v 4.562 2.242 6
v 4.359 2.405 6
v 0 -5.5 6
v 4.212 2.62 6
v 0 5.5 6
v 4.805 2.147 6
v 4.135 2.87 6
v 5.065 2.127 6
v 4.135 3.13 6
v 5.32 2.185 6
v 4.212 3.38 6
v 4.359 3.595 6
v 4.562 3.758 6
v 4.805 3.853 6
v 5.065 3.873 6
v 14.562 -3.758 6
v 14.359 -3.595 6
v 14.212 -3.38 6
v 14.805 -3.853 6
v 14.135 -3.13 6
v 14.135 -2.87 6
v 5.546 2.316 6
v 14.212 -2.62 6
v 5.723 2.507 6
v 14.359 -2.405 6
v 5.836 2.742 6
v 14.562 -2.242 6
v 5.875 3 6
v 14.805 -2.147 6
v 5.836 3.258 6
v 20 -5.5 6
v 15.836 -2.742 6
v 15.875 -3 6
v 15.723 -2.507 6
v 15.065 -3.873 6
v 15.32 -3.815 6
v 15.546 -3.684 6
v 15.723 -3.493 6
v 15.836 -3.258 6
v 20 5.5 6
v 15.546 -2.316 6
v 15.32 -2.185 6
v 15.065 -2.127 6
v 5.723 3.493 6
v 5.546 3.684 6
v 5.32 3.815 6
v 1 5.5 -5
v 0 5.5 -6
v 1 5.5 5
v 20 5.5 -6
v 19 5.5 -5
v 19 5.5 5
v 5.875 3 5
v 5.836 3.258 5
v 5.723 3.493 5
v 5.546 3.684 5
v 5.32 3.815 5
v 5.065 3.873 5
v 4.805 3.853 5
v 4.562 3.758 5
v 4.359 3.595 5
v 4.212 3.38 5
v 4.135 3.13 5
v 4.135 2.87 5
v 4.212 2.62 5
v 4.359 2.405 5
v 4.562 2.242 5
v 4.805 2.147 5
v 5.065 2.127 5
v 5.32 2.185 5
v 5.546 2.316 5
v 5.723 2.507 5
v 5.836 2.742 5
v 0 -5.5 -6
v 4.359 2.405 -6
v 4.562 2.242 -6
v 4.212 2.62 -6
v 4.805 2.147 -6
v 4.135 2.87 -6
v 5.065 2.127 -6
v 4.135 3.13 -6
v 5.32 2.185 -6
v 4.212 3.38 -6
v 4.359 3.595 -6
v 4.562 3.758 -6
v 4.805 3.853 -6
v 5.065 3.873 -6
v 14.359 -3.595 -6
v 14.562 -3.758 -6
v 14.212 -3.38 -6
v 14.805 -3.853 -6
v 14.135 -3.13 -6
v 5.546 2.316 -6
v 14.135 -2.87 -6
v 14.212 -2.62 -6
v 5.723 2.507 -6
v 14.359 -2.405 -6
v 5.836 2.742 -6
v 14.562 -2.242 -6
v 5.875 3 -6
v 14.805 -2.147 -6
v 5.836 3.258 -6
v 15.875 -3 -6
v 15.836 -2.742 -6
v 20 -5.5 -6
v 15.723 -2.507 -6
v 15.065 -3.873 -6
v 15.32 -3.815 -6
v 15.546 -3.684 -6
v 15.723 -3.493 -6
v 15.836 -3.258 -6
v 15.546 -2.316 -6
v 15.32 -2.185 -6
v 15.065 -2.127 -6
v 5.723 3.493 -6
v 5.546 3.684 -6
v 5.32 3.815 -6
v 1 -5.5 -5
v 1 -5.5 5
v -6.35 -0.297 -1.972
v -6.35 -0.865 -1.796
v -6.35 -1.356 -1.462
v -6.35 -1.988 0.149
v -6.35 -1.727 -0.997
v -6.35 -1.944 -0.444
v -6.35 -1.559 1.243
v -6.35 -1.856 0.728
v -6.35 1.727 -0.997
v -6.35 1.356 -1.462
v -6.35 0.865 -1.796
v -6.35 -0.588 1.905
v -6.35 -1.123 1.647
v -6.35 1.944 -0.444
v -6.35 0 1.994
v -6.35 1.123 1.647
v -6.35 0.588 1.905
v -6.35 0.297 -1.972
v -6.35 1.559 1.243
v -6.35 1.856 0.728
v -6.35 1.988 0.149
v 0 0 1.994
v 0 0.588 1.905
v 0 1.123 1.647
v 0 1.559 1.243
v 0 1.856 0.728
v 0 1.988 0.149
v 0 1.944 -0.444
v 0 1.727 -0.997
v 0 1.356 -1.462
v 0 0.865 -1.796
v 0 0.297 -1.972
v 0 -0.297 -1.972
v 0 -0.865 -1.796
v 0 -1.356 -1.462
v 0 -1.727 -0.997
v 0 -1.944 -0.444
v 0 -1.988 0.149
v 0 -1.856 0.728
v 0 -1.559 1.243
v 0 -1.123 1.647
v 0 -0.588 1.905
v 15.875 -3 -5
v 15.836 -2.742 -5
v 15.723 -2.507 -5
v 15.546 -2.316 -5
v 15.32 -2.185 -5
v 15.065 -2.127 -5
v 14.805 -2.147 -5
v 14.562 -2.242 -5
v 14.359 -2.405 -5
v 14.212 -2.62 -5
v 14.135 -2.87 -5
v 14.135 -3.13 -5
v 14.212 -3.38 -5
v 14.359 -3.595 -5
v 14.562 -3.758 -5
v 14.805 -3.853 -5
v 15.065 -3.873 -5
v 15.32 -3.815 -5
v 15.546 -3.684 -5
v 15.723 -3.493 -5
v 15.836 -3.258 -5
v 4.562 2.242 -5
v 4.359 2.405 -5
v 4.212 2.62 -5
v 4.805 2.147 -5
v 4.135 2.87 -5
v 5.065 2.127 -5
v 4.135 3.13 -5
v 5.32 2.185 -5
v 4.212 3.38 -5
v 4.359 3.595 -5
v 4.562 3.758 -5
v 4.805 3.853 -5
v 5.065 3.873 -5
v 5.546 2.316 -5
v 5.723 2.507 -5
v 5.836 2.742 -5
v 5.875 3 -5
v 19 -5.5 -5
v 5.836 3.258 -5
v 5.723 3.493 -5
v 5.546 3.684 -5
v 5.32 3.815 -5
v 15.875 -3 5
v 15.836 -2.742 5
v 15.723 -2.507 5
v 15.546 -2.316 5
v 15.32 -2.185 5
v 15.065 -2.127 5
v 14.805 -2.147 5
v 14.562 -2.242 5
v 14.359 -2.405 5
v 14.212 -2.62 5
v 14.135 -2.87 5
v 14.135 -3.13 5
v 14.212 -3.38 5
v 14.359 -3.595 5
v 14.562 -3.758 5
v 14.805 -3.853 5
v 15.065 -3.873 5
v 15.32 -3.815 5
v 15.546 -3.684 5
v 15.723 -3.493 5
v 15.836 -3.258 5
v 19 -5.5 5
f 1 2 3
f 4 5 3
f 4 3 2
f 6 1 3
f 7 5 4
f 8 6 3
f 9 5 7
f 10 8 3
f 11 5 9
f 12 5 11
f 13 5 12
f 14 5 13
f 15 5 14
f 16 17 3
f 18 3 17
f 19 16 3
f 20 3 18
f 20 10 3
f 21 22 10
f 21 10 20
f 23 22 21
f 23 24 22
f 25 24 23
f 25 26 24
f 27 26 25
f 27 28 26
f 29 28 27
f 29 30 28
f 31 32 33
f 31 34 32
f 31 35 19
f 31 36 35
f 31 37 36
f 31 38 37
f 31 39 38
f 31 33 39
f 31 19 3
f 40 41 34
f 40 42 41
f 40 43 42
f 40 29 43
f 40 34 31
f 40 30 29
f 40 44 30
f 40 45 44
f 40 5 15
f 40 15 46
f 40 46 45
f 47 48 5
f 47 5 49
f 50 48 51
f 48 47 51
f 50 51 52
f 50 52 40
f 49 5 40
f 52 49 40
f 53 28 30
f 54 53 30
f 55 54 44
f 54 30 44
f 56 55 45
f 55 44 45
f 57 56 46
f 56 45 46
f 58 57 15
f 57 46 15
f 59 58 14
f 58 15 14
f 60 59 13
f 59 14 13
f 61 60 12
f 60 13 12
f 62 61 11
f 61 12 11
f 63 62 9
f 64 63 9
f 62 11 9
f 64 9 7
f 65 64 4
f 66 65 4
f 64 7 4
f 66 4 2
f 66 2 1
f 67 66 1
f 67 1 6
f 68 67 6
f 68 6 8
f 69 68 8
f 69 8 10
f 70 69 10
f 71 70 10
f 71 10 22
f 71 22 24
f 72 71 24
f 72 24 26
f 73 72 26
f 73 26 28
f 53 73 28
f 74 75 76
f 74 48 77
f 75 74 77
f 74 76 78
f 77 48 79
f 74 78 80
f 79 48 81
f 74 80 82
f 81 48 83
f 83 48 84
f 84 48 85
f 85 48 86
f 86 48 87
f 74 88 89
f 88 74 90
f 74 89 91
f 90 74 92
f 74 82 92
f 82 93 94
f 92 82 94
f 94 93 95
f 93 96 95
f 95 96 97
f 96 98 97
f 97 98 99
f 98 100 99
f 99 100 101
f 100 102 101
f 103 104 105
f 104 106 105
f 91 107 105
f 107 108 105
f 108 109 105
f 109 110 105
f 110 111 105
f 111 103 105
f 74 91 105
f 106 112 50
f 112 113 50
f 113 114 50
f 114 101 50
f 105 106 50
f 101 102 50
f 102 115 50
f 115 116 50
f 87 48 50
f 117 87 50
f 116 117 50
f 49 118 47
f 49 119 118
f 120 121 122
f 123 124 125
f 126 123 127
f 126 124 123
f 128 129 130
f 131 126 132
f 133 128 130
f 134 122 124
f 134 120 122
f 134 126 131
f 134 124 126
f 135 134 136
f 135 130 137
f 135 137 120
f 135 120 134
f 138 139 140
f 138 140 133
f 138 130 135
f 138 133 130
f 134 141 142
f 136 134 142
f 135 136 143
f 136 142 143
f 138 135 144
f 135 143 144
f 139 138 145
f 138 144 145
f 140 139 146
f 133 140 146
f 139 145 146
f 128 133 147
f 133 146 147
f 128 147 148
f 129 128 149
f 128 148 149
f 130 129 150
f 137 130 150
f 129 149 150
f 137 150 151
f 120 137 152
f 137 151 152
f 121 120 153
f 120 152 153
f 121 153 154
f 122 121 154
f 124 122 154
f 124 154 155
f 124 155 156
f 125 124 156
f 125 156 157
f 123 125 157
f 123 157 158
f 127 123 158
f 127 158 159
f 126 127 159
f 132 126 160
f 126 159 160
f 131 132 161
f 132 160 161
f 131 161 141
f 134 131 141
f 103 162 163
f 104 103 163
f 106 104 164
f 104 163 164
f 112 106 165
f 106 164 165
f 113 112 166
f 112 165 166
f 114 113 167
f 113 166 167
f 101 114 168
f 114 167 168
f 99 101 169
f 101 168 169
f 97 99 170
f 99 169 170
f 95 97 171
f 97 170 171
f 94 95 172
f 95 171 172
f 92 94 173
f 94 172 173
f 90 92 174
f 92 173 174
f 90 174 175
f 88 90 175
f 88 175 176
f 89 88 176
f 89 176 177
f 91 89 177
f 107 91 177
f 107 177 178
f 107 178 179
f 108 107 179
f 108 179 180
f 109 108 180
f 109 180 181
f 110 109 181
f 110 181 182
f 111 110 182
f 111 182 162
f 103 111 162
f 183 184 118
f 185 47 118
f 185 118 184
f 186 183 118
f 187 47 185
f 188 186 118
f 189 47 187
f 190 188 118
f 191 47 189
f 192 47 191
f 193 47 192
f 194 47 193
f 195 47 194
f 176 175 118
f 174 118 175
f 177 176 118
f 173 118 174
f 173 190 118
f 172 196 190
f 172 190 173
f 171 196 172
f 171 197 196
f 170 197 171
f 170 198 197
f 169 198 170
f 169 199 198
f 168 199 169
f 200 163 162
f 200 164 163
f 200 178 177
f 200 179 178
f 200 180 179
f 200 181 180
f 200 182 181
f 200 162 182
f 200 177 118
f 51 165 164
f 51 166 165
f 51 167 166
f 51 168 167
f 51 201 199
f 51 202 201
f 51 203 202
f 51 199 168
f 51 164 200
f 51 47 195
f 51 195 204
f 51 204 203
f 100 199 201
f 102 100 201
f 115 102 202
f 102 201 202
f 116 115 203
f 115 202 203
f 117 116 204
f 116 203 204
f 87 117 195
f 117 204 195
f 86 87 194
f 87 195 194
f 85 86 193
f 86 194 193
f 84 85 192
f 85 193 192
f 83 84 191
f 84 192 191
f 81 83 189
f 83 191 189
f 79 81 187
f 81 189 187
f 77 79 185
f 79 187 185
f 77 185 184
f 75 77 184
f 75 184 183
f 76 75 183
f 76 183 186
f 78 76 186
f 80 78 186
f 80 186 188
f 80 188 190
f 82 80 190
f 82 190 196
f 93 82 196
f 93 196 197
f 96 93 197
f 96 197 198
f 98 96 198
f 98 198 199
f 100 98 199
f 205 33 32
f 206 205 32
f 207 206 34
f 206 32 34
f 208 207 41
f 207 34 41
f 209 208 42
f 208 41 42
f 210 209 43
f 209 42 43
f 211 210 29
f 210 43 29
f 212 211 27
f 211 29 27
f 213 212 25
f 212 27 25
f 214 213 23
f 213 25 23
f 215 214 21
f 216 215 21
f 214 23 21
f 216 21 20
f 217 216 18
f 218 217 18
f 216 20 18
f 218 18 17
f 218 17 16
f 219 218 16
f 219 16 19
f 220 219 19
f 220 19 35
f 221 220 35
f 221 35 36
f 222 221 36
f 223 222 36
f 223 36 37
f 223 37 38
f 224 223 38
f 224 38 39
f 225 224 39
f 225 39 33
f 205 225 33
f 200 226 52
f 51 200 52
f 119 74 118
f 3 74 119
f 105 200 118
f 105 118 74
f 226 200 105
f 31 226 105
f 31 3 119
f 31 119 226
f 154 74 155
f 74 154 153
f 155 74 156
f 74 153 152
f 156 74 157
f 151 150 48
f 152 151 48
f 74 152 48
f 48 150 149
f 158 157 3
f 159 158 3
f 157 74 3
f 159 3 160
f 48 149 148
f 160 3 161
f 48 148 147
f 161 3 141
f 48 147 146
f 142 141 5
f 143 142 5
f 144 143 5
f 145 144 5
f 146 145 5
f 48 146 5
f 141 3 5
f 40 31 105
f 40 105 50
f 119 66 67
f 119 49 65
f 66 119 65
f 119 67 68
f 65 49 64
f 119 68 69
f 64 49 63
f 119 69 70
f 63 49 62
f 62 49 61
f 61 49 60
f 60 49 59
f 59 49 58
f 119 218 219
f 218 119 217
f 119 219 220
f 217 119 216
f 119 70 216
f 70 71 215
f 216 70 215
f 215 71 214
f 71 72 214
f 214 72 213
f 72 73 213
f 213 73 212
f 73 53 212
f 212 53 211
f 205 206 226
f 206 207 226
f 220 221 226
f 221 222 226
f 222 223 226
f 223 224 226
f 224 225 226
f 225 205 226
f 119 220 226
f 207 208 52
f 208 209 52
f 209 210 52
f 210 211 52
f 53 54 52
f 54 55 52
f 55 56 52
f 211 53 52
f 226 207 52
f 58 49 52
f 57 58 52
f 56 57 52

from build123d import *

# Parameters (mm, degrees)
SKETCH1_W           = 20
SKETCH1_H           = 11
BOSS_EXTRUDE1_DEPTH = 6
SHELL1_T            = -1
SKETCH2_R           = 1.9939
BOSS_EXTRUDE2_DEPTH = 6.35
SKETCH3_R           = 0.875
CUT_EXTRUDE1_DEPTH  = 24.963513933


with BuildPart() as part:
    # Sketch1 → Boss-Extrude1 (new, symmetric)
    with BuildSketch(Plane.XY):
        with Locations((10, 0)):
            Rectangle(SKETCH1_W, SKETCH1_H)
    extrude(amount=BOSS_EXTRUDE1_DEPTH, both=True)

    # Shell1
    shell1_openings = [part.faces().sort_by_distance(p)[0] for p in [
        (10, 5.5, 0),
        (10, -5.5, 0),
    ]]
    offset(amount=SHELL1_T, openings=shell1_openings, kind=Kind.INTERSECTION)

    # Sketch2 → Boss-Extrude2 (add)
    with BuildSketch(Plane.ZY):
        Circle(SKETCH2_R)
    extrude(amount=BOSS_EXTRUDE2_DEPTH)

    # Sketch3 → Cut-Extrude1 (cut, through all)
    with BuildSketch(Plane.XY.offset(6)):
        with Locations((5, 3)):
            Circle(SKETCH3_R)
        with Locations((15, -3)):
            Circle(SKETCH3_R)
    extrude(amount=-CUT_EXTRUDE1_DEPTH, mode=Mode.SUBTRACT)


solid = part.part
